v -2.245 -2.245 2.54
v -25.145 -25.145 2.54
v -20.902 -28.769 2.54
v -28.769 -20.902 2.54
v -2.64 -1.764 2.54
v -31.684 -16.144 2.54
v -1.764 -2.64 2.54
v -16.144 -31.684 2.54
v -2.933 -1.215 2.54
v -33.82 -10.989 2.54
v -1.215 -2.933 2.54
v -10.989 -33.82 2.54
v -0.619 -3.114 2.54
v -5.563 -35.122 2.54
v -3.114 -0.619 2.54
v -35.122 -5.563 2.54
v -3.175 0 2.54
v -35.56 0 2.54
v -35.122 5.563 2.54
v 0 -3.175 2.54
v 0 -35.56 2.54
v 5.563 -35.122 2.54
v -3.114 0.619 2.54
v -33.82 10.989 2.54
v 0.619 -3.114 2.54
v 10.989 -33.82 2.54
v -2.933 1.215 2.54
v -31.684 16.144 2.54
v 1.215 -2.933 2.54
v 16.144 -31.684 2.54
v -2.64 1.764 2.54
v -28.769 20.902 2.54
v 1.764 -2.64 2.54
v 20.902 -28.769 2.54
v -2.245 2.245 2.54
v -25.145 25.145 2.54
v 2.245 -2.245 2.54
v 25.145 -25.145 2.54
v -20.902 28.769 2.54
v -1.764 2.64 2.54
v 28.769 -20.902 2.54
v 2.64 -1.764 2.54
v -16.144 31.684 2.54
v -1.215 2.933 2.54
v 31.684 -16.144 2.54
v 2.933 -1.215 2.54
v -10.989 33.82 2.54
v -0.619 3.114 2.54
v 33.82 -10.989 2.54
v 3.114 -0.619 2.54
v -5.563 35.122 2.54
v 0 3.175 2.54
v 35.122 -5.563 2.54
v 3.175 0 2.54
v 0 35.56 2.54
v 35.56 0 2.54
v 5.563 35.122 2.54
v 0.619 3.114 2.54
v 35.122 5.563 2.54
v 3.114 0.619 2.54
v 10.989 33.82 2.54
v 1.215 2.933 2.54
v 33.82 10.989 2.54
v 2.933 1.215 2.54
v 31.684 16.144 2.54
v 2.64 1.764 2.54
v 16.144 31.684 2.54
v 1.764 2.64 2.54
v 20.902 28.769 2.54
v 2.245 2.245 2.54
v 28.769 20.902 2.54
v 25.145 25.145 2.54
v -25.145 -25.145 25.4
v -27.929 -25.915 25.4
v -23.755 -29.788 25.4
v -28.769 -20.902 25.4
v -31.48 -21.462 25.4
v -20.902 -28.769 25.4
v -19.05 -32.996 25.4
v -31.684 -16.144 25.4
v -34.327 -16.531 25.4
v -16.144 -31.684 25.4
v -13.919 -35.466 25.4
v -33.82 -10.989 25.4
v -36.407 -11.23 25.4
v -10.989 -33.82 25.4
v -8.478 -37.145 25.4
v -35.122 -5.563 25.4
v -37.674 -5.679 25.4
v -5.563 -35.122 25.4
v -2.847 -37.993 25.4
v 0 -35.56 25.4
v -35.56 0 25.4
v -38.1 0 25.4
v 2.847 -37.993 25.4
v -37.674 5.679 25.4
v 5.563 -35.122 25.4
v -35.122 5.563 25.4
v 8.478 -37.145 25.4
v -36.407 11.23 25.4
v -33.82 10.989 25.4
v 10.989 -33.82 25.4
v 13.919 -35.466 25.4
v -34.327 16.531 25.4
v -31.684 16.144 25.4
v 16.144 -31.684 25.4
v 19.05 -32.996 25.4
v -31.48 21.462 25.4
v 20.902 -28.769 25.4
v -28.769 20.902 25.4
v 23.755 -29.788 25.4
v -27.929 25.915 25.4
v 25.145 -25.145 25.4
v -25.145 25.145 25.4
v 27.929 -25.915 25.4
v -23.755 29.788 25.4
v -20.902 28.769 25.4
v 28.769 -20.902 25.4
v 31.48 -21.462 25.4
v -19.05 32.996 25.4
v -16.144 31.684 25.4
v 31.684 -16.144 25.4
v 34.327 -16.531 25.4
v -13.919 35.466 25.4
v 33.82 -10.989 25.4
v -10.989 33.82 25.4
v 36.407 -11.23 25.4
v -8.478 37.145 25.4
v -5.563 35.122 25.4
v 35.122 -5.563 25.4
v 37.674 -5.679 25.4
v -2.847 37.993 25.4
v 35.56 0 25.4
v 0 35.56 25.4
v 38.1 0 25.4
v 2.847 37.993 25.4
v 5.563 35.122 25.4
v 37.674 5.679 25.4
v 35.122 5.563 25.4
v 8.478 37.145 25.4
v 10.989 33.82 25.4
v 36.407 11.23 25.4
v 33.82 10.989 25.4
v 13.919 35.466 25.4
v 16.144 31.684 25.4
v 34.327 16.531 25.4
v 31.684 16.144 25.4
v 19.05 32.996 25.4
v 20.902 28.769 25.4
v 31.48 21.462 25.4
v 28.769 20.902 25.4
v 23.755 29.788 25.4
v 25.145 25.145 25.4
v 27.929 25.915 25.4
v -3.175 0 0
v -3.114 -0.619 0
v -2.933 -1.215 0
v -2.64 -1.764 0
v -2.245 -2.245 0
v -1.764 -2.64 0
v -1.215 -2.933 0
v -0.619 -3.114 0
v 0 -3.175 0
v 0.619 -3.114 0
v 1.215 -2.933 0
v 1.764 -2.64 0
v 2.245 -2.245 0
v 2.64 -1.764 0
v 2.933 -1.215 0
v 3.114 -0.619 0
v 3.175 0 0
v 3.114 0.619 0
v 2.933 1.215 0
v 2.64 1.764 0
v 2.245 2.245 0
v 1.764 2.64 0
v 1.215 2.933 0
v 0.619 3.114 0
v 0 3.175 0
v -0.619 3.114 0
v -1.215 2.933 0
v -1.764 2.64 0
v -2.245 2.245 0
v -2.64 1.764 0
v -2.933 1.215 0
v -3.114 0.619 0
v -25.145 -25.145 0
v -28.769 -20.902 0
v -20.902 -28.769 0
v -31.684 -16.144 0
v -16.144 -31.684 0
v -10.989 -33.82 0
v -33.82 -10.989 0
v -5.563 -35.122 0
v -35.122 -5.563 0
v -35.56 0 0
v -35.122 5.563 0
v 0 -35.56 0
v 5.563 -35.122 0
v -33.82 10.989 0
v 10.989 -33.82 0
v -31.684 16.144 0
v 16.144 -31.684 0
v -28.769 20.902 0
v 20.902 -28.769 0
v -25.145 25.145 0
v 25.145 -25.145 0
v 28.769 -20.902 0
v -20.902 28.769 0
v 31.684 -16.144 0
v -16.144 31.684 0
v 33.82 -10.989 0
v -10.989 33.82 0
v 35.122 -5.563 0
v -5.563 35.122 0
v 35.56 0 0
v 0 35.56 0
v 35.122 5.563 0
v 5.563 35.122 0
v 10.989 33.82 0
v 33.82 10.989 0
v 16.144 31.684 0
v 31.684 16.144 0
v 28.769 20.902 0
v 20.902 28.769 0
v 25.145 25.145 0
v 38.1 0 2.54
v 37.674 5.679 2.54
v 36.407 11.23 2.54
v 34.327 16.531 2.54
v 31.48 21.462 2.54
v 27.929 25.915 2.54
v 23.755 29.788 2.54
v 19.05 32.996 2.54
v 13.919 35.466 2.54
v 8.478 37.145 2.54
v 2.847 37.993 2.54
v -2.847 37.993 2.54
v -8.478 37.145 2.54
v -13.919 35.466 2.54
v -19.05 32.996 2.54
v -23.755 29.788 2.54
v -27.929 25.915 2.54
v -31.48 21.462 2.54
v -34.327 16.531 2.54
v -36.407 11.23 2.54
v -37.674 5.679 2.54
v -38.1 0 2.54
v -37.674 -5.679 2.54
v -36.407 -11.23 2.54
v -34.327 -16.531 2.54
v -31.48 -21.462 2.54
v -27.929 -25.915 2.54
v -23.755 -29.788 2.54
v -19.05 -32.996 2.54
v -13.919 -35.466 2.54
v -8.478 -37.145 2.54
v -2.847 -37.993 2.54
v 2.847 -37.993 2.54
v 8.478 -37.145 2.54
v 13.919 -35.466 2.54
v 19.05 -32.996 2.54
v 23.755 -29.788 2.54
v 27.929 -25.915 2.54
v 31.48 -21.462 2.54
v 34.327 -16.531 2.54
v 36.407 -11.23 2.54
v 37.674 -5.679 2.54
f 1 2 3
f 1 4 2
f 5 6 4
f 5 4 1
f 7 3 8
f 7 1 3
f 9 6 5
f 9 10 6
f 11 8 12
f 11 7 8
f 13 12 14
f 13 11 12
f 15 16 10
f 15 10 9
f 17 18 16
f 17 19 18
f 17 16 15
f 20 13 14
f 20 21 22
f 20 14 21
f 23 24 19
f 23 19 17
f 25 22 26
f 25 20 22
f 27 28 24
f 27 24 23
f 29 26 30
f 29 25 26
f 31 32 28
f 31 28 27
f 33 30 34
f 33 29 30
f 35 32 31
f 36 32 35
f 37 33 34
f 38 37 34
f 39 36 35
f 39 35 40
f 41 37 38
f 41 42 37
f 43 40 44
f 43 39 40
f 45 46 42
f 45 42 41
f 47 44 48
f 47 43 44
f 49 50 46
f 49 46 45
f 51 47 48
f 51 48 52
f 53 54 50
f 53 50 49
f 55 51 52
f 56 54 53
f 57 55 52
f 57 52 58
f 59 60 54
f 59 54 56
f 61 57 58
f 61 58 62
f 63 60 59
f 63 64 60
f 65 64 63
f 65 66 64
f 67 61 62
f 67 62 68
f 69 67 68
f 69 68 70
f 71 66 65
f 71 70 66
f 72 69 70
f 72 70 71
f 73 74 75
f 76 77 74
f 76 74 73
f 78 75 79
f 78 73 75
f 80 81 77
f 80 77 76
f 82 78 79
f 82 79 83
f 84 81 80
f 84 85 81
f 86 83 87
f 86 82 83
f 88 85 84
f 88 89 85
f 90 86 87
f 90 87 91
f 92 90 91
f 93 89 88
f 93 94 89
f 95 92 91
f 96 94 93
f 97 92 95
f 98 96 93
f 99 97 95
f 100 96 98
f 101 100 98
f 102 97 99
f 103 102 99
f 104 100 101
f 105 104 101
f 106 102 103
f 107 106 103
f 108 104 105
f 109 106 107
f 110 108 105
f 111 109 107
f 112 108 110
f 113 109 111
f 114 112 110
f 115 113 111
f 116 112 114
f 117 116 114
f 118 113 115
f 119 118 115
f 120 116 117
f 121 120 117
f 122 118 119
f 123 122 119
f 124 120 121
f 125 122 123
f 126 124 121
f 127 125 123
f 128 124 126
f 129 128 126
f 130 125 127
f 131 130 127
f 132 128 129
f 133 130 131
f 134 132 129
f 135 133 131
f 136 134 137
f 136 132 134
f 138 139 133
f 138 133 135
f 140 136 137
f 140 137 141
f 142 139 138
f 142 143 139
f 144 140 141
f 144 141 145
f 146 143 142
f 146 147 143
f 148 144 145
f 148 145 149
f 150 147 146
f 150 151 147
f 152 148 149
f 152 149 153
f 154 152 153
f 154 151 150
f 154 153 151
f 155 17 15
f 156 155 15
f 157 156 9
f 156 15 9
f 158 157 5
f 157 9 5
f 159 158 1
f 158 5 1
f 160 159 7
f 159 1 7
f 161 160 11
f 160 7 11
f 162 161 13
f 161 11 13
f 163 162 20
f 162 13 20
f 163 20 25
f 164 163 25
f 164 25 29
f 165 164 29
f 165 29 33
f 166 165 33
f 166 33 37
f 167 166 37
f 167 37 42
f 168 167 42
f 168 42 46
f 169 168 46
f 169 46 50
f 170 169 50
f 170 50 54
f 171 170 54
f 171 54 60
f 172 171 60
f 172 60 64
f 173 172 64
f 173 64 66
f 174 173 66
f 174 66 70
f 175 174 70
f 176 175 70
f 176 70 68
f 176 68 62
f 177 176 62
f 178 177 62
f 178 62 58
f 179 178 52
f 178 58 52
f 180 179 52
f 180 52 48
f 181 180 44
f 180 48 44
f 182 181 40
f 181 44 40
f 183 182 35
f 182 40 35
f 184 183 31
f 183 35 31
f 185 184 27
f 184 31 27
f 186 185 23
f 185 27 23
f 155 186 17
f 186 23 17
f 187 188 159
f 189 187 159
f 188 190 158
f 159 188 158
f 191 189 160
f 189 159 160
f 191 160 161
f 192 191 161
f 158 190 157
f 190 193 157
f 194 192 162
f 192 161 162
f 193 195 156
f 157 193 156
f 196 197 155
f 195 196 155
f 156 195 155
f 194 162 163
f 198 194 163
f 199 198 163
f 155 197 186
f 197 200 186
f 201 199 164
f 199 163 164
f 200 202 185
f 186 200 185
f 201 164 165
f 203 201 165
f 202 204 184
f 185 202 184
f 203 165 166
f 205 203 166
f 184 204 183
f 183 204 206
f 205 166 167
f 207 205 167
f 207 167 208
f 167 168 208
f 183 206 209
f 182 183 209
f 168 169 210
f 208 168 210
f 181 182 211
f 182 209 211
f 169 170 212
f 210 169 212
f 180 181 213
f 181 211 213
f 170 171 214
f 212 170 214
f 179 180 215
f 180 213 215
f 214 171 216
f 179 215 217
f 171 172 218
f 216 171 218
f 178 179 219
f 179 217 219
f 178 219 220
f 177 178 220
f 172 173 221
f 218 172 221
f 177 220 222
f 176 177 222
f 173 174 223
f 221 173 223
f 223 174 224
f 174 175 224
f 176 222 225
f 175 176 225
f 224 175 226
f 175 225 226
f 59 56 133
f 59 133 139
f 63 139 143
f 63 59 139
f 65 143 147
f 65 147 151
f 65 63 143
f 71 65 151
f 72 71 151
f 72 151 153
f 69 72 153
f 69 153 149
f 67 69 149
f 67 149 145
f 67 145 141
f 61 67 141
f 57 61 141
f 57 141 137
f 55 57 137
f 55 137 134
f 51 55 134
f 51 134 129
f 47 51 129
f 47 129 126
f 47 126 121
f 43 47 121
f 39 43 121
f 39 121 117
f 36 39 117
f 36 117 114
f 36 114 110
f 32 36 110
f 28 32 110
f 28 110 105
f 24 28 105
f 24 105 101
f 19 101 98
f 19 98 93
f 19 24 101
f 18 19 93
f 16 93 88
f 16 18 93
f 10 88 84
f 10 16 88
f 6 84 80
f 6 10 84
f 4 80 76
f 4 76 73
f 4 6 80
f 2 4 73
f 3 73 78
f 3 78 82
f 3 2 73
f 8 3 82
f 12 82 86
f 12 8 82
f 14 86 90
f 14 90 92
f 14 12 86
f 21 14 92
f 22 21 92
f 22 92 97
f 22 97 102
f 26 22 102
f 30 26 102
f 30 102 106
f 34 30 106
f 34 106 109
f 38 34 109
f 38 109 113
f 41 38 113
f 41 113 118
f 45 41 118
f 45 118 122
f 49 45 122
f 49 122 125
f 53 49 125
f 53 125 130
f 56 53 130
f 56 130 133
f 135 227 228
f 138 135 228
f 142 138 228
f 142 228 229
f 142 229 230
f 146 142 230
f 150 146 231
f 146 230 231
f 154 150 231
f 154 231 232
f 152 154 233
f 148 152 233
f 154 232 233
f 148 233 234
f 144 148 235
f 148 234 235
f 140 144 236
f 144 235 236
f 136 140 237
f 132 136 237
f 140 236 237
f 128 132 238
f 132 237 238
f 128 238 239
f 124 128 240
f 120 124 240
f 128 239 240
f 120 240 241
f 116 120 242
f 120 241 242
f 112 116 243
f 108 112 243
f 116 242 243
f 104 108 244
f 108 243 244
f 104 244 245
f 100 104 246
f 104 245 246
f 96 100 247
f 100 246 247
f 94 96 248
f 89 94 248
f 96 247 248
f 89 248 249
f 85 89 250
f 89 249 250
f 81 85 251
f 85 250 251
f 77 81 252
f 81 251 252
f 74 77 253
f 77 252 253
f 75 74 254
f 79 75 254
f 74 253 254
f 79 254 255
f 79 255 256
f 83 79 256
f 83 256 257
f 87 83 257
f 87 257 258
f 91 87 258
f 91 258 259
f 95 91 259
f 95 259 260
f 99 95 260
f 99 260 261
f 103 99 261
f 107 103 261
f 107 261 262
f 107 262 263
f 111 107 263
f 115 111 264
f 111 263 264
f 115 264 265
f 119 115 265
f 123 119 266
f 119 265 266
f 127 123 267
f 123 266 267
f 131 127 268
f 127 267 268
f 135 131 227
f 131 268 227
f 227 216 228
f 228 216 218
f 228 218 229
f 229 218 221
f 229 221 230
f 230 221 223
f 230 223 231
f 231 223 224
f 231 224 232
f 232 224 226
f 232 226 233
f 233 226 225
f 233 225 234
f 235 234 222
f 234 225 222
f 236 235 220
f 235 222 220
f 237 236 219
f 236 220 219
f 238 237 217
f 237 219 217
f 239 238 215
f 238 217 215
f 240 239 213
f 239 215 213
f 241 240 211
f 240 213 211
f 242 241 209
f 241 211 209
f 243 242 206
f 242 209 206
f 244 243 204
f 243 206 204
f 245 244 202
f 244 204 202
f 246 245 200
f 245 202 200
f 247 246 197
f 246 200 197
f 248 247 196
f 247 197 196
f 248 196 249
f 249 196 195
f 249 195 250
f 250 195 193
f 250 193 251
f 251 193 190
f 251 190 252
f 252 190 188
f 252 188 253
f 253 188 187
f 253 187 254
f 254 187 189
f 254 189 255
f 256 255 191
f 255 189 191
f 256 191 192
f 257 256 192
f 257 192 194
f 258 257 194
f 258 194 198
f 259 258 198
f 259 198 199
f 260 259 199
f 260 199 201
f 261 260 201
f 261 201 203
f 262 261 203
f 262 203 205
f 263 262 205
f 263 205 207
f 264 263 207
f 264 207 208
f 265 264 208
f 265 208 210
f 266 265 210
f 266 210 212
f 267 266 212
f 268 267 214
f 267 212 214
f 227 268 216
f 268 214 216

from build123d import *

# Parameters (mm, degrees)
F0_R     = 38.1
F1_DEPTH = 25.4
F2_T     = -2.54
F3_SIZE  = 2.54
F5_D     = 6.35


with BuildPart() as f1:
    # F0 (on Top) → F1 (new body)
    with BuildSketch(Plane.XY):
        Circle(F0_R)
    extrude(amount=F1_DEPTH)

    # F2
    f2_openings = [f1.faces().sort_by_distance(p)[0] for p in [
        (0, 0, 25.4),
    ]]
    offset(amount=F2_T, openings=f2_openings)

    # F3
    f3_edges = [f1.edges().sort_by_distance(p)[0] for p in [
        (-38.1, 0, 0),
    ]]
    chamfer(f3_edges, length=F3_SIZE)

    # F5 (through all)
    with Locations(Plane(origin=(0, 0, 0), x_dir=(1, 0, 0), z_dir=(0, 0, -1))):
        with Locations((0, 0)):
            Hole(F5_D / 2)


solid = f1.part
